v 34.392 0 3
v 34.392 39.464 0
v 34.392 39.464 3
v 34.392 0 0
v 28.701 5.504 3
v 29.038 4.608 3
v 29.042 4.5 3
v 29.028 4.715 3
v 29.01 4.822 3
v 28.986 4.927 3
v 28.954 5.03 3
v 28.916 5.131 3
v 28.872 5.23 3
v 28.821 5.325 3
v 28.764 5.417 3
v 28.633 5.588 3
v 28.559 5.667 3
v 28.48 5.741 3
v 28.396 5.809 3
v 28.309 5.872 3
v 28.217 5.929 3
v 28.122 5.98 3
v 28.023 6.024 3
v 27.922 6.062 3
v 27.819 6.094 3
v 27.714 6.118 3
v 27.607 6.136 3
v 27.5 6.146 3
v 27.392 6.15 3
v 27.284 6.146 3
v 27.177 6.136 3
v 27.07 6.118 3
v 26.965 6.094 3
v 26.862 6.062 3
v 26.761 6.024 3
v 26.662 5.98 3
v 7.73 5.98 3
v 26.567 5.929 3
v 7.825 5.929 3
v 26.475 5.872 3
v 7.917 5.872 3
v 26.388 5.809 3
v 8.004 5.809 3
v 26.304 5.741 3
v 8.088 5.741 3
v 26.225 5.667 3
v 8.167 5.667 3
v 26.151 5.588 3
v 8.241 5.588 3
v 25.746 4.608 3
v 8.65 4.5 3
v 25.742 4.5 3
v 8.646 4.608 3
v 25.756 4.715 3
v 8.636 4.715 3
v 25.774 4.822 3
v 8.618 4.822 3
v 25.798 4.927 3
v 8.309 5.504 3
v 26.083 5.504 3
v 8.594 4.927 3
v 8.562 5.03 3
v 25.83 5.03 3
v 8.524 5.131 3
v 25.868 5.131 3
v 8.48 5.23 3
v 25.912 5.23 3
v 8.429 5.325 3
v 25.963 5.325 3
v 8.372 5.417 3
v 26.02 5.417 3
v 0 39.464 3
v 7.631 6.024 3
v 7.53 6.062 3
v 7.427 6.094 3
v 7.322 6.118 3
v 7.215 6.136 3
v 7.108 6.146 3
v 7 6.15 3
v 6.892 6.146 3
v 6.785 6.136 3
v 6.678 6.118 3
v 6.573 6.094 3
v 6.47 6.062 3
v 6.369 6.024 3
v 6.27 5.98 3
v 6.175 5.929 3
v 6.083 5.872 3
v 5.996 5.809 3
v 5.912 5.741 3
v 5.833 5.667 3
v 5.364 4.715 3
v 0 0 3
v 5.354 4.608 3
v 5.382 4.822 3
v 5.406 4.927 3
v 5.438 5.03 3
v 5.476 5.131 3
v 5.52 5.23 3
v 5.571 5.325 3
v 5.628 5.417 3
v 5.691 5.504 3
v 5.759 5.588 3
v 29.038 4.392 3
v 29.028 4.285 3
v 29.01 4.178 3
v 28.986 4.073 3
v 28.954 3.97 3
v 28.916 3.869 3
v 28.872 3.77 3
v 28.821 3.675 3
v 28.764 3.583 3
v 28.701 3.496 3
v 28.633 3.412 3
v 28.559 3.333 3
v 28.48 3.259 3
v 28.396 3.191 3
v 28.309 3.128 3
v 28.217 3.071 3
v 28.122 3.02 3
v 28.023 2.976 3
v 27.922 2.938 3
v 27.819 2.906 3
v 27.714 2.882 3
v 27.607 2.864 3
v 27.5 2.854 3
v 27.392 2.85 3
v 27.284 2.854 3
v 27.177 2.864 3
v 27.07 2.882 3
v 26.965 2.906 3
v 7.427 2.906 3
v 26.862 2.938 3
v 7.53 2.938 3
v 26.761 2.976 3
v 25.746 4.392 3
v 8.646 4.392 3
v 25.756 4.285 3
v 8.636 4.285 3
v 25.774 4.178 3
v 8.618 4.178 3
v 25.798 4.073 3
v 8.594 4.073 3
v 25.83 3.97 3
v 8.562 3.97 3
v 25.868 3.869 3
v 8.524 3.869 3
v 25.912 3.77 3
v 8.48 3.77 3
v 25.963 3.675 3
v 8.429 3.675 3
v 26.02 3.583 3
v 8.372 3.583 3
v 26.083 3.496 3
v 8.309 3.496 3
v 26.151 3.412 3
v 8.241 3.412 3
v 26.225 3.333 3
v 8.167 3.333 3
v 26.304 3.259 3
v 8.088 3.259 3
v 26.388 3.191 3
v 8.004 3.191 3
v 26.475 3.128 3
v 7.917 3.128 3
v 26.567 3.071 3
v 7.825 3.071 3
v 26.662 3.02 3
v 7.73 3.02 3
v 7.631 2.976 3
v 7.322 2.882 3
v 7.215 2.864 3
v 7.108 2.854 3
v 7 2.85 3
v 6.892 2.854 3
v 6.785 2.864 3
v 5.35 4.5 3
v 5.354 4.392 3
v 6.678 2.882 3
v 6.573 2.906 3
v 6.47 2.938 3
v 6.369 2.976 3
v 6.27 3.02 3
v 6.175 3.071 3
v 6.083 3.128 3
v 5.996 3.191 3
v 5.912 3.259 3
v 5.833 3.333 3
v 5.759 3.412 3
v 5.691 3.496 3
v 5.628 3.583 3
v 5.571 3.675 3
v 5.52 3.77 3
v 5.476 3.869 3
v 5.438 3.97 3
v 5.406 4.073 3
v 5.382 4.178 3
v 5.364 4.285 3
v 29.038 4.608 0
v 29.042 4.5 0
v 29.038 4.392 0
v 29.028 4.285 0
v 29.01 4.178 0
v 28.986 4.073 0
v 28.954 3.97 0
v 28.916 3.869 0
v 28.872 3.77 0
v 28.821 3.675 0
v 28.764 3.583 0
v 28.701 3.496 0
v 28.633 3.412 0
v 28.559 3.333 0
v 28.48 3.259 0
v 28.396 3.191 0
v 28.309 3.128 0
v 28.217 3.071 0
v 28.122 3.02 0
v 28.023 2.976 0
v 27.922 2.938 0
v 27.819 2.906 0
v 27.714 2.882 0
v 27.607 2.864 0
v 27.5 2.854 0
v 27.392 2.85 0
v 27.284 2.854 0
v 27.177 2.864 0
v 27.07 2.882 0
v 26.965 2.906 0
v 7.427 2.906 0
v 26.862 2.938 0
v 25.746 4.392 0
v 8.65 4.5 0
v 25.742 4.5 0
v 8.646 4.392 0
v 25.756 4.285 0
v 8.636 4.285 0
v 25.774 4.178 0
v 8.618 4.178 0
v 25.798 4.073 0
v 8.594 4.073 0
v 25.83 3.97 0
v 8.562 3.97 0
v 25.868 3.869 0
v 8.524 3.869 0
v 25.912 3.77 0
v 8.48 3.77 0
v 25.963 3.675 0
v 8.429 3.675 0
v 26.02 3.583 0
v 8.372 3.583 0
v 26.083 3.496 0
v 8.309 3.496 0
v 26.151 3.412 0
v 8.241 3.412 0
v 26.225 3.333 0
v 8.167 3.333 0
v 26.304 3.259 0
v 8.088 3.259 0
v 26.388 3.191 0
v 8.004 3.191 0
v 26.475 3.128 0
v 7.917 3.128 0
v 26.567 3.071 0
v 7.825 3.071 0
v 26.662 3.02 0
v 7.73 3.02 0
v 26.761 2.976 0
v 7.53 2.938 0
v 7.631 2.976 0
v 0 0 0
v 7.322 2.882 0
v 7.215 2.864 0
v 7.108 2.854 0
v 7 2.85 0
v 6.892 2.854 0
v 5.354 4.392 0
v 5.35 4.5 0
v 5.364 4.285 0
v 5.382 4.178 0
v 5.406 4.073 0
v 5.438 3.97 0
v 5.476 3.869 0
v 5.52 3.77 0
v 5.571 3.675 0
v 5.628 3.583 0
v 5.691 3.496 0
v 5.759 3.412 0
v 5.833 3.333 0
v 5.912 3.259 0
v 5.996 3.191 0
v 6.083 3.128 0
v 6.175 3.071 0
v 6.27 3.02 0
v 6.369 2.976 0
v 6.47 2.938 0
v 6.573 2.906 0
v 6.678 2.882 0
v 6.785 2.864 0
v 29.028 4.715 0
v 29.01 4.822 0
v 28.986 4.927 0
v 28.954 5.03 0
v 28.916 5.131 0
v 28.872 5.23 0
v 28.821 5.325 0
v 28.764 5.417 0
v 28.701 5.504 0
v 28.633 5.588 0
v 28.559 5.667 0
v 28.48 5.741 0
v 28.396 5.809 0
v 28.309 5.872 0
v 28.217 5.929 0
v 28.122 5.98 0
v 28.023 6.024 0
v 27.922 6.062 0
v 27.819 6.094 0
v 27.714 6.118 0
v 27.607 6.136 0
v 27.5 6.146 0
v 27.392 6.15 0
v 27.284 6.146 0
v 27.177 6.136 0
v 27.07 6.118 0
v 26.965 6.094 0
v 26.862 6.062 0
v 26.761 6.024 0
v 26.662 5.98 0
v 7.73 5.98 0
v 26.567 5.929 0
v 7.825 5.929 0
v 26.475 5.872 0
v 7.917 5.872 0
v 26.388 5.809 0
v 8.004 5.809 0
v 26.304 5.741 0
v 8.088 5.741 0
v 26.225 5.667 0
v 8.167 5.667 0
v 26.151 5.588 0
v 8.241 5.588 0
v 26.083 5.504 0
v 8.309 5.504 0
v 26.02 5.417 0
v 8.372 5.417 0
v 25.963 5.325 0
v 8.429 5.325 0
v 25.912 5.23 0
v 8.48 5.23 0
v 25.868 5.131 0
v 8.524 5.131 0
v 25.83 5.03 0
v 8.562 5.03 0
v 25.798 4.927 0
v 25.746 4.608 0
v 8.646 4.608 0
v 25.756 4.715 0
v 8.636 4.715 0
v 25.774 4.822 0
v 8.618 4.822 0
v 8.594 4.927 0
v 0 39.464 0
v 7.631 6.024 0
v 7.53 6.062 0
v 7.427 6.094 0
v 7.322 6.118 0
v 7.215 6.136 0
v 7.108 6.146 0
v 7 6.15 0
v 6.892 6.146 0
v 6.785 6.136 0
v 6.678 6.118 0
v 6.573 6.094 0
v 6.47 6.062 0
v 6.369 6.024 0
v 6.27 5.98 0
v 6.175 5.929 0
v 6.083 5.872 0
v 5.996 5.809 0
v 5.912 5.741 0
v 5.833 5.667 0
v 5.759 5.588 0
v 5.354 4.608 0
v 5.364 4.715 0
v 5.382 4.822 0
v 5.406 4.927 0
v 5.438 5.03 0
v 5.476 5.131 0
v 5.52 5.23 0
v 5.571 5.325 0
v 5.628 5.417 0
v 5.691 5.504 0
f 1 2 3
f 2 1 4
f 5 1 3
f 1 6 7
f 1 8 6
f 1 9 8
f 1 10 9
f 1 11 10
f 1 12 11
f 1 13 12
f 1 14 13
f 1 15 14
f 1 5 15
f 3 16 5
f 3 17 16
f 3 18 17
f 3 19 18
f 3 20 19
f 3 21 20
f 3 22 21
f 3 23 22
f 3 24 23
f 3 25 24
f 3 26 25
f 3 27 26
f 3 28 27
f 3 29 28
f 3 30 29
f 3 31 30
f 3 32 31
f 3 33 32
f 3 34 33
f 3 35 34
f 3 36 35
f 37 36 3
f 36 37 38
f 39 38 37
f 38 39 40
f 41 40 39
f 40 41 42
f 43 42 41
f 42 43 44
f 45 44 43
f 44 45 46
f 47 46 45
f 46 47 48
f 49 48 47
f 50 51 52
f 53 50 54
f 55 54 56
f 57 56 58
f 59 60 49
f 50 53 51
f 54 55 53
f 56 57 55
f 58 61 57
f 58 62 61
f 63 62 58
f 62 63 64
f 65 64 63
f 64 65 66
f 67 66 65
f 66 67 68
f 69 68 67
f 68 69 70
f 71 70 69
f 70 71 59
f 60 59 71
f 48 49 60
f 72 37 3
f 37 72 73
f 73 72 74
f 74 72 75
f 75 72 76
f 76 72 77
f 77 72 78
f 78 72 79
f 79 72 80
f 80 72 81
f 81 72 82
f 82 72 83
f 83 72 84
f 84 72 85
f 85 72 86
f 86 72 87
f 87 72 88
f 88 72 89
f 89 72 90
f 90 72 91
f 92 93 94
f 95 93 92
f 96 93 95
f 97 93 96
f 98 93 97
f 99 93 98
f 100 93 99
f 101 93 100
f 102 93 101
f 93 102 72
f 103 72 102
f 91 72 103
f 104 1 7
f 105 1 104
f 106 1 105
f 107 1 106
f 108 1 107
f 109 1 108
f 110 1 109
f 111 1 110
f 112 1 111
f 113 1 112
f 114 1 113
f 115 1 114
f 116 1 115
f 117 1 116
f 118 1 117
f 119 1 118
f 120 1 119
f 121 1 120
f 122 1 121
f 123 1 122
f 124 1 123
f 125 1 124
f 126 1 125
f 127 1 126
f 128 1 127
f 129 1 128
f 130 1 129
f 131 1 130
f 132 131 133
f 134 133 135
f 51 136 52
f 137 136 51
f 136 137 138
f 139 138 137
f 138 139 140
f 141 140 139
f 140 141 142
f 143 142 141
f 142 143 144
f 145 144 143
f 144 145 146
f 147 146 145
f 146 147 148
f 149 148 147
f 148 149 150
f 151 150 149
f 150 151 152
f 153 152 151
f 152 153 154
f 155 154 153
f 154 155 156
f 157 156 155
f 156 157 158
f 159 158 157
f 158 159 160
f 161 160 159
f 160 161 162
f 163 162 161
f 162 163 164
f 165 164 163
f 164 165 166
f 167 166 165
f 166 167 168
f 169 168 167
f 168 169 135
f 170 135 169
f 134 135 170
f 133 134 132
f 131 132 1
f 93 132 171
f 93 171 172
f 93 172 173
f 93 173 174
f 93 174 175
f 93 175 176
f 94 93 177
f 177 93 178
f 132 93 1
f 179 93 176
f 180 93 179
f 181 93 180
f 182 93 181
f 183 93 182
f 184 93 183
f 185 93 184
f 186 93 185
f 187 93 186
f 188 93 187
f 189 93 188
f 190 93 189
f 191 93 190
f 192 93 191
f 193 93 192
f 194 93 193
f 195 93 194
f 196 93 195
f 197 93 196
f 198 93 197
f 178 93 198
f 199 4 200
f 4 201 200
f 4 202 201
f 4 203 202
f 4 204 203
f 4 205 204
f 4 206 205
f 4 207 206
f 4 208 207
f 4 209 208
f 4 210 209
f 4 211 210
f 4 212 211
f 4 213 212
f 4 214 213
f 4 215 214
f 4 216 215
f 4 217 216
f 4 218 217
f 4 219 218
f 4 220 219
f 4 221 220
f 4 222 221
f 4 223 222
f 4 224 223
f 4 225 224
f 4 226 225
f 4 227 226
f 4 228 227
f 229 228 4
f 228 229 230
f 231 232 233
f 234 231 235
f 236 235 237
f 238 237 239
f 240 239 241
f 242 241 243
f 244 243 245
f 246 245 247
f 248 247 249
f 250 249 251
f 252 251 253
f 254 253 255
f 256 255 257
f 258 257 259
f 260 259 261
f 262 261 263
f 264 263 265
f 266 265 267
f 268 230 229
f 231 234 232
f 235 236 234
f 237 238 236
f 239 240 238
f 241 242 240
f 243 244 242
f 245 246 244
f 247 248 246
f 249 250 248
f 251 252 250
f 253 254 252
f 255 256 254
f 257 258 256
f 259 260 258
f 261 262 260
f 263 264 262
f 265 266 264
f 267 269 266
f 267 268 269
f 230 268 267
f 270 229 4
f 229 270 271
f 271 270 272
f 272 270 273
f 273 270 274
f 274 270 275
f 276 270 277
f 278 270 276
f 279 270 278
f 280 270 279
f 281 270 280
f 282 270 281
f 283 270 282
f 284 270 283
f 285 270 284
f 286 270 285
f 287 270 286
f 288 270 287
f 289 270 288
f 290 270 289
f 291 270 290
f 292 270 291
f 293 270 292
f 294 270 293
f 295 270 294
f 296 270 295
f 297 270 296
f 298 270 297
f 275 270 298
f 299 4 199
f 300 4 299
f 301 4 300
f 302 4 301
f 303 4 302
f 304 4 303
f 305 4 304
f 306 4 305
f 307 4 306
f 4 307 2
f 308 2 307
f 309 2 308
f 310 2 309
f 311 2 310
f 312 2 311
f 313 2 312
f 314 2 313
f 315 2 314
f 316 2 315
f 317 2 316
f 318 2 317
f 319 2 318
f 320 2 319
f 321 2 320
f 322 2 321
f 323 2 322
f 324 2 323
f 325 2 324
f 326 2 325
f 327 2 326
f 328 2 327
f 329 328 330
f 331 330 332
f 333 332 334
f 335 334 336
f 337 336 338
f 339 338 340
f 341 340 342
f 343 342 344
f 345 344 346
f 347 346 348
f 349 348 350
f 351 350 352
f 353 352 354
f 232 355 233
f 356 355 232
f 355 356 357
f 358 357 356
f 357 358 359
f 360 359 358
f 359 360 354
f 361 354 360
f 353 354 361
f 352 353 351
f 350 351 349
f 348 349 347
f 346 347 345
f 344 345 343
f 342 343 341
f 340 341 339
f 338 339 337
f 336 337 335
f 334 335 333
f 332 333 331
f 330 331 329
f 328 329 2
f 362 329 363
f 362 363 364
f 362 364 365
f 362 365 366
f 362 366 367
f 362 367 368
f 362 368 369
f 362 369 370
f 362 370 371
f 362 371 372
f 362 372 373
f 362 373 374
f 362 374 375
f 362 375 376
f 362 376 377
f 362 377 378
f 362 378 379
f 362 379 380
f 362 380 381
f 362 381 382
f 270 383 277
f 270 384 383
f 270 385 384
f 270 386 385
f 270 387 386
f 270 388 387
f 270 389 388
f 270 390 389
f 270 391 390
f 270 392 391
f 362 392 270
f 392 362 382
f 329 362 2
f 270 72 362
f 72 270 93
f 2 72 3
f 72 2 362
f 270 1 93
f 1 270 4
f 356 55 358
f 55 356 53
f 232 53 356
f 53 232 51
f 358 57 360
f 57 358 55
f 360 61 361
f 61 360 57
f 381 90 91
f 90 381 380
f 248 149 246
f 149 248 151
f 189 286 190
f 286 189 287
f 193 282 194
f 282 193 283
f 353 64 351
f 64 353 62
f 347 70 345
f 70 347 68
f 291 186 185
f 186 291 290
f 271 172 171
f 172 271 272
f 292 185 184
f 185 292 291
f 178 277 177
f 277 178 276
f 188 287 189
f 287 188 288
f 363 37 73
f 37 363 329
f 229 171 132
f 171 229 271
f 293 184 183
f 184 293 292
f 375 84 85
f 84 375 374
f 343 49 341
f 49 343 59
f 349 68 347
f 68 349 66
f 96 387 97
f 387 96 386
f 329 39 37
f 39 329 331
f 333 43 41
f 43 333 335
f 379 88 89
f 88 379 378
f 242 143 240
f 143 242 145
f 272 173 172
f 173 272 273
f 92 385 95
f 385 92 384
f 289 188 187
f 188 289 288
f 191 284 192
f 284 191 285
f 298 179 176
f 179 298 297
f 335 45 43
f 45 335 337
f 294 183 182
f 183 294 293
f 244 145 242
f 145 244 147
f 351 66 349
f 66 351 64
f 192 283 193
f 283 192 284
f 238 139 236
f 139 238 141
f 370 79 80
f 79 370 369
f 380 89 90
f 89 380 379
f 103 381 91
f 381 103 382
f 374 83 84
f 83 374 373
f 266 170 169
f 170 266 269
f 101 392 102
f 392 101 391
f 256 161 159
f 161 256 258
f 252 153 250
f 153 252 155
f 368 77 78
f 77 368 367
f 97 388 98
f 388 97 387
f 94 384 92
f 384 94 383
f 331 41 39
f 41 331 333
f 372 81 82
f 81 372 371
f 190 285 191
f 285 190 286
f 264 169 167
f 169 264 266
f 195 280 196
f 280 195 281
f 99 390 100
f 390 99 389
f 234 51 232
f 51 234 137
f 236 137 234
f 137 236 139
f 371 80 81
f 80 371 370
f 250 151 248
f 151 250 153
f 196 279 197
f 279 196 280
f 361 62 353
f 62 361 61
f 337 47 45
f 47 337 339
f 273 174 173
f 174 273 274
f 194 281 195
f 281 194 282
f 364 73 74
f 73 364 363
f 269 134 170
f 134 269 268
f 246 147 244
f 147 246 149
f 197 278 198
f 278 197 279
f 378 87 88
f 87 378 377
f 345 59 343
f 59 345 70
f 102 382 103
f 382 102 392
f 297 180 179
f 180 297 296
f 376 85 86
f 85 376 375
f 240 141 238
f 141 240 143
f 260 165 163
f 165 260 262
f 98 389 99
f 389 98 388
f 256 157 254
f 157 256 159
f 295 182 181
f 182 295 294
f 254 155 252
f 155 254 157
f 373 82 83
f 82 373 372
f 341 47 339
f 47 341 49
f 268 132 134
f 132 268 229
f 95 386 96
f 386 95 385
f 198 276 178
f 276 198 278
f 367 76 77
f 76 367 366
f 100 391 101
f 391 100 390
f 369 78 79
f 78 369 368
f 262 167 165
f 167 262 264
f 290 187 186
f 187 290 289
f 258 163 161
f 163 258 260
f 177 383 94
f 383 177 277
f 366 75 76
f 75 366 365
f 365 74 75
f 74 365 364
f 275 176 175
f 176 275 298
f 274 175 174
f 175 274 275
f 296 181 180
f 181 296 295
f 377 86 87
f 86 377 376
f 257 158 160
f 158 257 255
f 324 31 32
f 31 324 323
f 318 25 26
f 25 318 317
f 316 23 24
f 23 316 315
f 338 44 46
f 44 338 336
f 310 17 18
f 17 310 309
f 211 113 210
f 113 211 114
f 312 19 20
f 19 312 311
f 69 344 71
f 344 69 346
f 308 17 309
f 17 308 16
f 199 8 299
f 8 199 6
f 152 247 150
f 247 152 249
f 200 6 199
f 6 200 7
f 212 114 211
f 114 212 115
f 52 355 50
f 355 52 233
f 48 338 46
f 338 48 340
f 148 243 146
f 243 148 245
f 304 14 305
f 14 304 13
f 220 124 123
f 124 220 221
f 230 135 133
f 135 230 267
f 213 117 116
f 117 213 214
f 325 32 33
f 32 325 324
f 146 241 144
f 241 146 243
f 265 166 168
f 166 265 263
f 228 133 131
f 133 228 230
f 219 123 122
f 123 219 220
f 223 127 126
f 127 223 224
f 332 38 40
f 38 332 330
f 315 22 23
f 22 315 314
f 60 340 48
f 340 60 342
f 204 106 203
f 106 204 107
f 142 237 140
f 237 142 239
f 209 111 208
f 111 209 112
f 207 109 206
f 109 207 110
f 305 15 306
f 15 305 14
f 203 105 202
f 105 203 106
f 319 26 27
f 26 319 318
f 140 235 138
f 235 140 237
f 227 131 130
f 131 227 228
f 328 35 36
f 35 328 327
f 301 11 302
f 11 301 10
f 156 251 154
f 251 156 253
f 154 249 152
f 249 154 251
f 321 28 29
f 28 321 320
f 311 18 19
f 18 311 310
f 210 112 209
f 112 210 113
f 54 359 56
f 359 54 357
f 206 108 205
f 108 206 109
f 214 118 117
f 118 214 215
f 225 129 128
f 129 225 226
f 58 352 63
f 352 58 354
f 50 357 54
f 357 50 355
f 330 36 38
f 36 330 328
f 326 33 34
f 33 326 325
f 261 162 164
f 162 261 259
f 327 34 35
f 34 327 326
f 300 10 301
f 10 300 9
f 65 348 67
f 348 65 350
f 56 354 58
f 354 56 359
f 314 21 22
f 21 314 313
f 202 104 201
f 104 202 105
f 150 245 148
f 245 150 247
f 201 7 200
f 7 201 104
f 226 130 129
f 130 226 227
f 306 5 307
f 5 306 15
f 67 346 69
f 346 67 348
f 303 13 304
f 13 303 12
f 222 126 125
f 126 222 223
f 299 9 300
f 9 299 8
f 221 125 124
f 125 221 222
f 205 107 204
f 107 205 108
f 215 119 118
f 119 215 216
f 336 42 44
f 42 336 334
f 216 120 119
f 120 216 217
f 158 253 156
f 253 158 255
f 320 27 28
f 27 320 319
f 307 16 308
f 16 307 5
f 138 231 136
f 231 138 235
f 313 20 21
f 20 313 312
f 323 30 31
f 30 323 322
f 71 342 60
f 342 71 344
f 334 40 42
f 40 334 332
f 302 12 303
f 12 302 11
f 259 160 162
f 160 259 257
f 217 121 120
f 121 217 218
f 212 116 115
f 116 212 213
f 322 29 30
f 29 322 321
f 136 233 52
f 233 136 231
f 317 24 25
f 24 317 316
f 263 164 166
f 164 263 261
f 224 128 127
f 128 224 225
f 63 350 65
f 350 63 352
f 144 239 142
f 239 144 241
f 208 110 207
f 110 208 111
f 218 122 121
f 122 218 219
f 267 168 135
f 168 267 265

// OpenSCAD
// Pocket lid (lid) for 137 MHz V-dipole for weather satellites
// PETG, 0.2 mm layers, 4 walls, 40% infill, no supports
// Print it: flat on the bed
// Generated by the blueprint skill from the plan at its current size. Units: mm.
$fn = 96;
translate([17.196, 24, -1218])
difference() {
  union() {
    translate([-17.196, -24, 1218]) cube([34.392, 39.464, 3]);
  }
  translate([-10.196, -19.5, 1217]) rotate([0, 0.000, 0.000]) translate([0, 0, -0.01]) cylinder(h = 5.020, r = 1.650);
  translate([10.196, -19.5, 1217]) rotate([0, 0.000, 0.000]) translate([0, 0, -0.01]) cylinder(h = 5.020, r = 1.650);
}
